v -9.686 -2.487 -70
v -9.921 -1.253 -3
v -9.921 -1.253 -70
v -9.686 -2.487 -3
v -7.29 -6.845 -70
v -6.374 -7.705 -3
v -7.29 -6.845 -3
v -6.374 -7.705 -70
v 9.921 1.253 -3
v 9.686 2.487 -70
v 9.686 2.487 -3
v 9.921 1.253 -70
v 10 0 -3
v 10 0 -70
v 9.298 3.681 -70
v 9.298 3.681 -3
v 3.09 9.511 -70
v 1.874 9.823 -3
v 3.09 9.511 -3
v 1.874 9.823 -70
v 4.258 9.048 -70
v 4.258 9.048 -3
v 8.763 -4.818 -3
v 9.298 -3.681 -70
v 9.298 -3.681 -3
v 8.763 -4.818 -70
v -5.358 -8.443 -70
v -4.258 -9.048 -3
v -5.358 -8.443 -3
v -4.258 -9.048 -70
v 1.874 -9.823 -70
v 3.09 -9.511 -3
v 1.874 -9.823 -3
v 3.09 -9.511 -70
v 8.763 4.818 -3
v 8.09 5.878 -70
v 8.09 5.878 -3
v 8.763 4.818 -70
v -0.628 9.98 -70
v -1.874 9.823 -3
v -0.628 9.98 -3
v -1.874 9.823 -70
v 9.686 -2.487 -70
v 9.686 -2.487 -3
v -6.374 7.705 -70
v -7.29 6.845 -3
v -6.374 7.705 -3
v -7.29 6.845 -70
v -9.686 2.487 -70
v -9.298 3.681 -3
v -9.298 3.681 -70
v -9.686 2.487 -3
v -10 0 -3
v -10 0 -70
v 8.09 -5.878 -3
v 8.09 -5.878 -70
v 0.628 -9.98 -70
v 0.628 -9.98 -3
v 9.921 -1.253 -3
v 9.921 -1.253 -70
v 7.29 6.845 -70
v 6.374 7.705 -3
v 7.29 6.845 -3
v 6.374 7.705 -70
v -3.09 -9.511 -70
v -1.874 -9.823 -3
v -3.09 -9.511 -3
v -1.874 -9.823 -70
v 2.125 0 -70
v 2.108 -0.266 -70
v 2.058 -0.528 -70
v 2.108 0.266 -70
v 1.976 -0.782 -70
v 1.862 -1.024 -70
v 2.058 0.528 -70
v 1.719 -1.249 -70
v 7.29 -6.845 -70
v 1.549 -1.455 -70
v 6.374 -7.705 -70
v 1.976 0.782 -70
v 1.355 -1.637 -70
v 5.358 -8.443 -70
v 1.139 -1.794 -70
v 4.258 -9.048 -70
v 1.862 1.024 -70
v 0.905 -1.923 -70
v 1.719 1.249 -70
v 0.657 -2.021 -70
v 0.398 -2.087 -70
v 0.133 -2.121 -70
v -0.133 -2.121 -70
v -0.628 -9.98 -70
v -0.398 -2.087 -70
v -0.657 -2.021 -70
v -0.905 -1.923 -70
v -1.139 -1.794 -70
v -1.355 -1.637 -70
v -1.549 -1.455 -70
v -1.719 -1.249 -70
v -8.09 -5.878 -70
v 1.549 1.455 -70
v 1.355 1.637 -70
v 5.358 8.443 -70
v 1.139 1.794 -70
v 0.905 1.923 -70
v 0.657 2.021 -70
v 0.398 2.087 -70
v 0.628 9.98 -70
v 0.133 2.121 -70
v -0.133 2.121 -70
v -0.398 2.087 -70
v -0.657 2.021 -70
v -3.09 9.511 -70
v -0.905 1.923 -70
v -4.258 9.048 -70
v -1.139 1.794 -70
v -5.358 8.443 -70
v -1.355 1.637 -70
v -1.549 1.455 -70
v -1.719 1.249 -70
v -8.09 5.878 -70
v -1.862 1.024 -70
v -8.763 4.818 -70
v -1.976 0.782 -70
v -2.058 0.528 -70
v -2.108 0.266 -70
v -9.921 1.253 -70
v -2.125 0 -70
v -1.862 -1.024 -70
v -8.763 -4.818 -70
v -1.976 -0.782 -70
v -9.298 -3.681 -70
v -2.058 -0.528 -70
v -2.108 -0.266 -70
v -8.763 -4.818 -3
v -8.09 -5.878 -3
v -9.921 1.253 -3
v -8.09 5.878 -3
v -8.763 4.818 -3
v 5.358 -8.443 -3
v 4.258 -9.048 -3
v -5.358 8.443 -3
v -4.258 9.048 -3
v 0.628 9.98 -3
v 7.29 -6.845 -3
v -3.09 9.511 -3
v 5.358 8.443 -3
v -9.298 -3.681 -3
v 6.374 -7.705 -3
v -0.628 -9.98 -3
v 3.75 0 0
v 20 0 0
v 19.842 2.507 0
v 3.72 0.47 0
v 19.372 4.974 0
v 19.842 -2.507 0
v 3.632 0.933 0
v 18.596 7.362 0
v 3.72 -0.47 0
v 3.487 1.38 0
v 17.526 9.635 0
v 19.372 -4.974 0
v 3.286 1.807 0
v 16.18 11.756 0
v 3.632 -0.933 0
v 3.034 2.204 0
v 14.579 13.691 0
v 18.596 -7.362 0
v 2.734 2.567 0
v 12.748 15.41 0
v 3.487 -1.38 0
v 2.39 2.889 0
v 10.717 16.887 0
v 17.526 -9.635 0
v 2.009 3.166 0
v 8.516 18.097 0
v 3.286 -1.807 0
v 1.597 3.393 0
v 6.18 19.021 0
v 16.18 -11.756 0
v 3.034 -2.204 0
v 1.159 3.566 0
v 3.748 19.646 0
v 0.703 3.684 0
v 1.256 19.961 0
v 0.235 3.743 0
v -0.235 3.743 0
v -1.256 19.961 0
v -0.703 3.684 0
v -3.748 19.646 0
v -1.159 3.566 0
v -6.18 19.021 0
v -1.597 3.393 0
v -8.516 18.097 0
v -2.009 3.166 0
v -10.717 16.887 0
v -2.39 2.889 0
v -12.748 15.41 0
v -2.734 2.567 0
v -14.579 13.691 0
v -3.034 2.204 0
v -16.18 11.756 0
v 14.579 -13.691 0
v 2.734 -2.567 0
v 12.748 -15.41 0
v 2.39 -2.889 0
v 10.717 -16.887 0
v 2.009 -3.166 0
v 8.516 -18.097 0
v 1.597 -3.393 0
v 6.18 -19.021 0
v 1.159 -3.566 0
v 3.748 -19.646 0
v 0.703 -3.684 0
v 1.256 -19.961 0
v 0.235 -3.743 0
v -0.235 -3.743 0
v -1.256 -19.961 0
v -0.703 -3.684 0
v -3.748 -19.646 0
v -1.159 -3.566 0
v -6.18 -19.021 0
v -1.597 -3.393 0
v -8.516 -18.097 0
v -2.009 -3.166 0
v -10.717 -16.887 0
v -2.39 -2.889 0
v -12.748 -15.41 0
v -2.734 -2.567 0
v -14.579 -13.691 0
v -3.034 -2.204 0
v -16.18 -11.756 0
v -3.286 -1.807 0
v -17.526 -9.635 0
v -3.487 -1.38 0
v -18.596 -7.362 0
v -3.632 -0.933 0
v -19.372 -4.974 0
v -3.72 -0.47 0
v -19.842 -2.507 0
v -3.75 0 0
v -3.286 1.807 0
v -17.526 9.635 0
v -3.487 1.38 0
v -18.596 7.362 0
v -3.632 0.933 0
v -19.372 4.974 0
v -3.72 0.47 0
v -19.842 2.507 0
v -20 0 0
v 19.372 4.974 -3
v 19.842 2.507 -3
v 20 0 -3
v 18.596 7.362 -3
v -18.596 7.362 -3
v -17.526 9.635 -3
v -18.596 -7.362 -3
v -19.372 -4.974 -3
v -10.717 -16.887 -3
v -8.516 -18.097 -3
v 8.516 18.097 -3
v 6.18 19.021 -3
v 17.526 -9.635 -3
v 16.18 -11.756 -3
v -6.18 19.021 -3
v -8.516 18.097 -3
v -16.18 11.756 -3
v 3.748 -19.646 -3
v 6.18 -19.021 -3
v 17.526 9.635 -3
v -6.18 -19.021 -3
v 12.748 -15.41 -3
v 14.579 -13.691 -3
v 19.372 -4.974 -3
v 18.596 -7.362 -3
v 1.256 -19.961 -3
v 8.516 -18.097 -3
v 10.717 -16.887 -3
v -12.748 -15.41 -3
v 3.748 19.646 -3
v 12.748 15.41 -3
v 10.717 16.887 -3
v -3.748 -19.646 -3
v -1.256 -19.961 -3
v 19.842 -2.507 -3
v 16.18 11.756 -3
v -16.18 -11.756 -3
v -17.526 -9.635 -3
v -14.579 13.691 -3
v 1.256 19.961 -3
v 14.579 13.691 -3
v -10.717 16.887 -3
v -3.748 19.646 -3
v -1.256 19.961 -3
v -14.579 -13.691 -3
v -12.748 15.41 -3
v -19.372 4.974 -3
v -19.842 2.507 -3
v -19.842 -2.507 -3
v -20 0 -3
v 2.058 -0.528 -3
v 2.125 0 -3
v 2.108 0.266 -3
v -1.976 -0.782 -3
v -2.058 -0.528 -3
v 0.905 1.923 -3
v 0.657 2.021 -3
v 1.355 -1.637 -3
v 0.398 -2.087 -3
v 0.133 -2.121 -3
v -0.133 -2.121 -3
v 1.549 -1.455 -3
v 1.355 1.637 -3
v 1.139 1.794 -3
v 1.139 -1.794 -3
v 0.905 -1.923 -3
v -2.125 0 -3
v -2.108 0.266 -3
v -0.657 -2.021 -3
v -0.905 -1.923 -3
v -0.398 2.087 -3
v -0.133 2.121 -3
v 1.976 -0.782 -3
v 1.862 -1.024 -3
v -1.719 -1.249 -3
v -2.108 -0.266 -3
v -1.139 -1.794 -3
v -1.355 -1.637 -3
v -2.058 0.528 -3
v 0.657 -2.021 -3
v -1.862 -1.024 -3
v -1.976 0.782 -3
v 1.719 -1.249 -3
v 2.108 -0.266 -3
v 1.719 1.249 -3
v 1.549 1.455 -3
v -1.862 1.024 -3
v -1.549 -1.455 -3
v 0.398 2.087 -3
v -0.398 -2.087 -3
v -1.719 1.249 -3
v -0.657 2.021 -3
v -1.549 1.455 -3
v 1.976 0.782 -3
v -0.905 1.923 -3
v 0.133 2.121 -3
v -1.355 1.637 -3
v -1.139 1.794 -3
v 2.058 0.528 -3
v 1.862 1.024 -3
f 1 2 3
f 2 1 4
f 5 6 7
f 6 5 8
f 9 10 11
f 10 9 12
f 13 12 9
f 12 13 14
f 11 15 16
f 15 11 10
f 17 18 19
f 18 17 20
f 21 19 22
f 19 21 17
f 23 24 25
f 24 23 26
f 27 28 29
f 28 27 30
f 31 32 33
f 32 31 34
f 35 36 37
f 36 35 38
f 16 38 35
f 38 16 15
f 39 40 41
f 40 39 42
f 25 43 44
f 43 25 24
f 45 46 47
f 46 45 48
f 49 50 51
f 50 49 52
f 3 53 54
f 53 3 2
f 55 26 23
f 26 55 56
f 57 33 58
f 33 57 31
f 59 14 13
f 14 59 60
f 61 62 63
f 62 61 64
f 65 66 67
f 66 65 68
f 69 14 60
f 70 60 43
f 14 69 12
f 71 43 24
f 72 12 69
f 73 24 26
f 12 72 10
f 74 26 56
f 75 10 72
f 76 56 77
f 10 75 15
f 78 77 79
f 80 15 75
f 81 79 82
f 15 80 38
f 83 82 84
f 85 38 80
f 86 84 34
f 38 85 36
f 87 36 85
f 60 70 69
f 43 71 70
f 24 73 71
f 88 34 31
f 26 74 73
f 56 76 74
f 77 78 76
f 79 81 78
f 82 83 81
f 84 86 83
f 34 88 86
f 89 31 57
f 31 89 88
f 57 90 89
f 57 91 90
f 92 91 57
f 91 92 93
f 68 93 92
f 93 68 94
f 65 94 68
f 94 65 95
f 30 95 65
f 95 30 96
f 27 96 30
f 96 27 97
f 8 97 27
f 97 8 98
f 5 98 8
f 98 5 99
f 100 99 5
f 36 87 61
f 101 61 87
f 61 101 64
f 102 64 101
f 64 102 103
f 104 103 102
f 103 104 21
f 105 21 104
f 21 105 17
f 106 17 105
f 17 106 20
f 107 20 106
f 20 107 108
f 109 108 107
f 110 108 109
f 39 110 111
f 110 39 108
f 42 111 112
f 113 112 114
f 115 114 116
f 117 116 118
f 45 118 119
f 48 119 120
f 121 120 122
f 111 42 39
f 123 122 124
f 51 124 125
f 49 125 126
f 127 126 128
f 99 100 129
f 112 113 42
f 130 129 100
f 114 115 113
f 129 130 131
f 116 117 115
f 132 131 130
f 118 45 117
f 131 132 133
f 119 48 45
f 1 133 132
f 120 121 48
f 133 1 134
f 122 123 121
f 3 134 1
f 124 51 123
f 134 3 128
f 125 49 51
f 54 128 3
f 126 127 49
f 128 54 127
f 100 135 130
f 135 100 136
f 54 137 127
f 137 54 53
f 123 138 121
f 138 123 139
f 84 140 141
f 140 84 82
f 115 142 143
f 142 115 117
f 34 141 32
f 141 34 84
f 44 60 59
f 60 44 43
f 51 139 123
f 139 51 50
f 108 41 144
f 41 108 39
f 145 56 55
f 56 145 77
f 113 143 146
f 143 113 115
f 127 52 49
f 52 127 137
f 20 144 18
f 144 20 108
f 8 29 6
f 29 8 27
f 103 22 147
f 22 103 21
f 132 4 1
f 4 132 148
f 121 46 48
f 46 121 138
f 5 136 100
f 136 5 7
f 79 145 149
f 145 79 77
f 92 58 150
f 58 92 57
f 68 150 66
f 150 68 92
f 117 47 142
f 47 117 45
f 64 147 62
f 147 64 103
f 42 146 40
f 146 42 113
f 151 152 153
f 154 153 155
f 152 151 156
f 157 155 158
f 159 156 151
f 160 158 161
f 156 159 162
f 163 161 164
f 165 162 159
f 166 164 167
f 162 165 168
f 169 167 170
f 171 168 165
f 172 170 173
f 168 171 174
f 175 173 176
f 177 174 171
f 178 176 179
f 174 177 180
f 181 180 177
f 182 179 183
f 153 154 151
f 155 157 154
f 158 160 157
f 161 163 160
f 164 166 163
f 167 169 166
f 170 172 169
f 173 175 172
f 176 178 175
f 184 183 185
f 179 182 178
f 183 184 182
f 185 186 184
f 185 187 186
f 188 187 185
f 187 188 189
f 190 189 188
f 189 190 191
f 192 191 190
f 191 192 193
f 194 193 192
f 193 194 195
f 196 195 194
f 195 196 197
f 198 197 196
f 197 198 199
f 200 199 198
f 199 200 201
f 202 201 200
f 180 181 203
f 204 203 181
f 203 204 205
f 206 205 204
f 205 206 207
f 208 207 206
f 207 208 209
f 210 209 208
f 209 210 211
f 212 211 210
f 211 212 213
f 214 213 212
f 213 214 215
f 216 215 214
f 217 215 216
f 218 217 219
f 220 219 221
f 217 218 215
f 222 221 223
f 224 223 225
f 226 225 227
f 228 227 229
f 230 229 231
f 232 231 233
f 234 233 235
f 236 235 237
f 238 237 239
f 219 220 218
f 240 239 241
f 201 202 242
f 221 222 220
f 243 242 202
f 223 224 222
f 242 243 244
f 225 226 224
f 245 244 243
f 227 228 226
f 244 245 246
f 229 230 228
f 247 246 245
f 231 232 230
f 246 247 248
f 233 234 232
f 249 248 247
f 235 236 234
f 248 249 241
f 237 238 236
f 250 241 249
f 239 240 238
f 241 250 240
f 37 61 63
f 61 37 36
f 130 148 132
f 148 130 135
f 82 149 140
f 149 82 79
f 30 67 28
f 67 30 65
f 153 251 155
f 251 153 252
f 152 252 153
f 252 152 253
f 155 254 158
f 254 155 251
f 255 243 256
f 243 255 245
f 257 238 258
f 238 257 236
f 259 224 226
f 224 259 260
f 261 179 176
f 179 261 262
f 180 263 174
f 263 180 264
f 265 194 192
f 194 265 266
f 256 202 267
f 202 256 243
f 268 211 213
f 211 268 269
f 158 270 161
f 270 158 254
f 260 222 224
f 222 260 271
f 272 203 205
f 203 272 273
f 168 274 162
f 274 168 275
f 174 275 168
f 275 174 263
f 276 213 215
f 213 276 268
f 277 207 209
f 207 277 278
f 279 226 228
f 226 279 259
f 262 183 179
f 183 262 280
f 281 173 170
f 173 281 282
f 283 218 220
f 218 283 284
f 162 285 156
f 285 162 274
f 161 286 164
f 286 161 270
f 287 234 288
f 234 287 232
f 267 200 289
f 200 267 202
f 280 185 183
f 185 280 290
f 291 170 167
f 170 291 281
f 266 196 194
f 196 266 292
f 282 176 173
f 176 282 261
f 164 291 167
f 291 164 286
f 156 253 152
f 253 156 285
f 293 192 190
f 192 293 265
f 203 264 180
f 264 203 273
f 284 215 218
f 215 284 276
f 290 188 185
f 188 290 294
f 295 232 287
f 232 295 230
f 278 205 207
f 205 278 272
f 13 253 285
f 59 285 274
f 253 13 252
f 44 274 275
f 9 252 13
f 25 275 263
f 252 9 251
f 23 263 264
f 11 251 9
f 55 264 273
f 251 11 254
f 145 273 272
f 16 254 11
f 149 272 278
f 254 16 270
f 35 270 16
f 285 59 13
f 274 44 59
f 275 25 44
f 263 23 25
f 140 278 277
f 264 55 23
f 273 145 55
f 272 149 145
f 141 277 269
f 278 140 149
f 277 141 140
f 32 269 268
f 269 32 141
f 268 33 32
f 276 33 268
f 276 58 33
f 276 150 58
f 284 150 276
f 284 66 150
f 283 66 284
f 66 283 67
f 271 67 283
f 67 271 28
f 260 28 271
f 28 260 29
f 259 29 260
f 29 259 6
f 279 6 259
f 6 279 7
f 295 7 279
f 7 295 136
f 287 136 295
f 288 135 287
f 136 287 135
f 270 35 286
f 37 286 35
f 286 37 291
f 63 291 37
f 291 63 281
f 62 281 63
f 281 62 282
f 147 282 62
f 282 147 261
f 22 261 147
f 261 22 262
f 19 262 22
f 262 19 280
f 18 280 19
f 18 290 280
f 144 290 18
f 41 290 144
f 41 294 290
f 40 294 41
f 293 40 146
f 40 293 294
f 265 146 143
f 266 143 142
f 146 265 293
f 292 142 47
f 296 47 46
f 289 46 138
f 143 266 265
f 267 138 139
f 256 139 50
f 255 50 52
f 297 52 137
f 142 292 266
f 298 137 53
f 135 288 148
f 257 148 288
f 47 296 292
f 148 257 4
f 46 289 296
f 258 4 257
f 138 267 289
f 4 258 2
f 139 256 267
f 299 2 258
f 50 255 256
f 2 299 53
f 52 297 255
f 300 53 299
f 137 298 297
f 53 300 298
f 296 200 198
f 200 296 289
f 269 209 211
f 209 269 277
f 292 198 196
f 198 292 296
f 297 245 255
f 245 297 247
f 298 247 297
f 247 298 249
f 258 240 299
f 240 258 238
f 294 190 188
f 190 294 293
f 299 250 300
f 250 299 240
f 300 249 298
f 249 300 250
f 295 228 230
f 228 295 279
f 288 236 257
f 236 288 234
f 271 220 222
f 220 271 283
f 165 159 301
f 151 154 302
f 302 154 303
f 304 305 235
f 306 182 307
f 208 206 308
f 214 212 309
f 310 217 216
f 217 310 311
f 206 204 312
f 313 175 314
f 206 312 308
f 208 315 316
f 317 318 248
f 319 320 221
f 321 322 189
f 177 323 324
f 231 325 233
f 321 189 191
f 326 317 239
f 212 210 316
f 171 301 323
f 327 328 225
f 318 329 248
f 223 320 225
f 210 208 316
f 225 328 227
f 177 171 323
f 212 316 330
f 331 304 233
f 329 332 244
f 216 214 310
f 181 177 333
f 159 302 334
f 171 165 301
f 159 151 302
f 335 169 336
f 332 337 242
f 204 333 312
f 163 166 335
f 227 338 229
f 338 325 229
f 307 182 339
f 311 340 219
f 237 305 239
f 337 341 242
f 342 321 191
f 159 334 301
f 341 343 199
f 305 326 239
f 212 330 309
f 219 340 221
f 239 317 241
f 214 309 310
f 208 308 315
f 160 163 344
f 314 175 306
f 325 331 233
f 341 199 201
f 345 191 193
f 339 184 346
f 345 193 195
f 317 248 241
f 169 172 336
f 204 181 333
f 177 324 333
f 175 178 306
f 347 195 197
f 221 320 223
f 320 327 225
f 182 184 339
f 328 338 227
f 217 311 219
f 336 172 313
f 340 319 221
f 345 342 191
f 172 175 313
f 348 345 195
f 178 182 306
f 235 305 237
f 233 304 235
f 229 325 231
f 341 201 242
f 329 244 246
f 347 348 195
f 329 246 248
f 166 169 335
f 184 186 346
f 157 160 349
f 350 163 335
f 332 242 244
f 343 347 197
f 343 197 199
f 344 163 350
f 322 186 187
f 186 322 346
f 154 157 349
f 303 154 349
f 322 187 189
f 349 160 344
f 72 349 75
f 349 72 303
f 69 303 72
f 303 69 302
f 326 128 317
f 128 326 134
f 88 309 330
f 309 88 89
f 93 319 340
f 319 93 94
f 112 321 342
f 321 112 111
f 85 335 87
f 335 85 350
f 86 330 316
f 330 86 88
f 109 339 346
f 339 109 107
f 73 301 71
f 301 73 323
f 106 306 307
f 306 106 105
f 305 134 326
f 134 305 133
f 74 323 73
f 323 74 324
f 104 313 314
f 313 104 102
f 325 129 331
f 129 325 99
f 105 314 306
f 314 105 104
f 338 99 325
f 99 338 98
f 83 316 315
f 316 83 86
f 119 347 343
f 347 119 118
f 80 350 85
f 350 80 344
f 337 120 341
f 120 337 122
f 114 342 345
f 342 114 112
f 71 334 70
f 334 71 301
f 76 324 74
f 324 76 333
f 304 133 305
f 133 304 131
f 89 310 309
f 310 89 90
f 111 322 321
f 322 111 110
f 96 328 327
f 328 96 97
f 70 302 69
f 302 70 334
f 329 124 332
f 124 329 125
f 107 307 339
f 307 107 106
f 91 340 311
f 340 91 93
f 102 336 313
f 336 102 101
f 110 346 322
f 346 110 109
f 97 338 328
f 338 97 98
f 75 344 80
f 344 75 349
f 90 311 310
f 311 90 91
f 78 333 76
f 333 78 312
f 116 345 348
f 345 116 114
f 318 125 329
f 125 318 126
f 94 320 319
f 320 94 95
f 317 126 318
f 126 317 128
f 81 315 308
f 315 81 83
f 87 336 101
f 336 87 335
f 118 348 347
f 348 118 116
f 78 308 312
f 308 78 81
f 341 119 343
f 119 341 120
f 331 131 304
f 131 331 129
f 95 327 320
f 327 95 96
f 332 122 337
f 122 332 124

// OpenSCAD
$fn = 50;


difference() {
	union() {
		translate(v = [0, 0, -70.0000000000]) {
			cylinder(h = 70, r = 10.0000000000);
		}
		translate(v = [0, 0, -3.0000000000]) {
			cylinder(h = 3, r = 20.0000000000);
		}
	}
	union() {
		translate(v = [0, 0, 0]) {
			rotate(a = [0, 0, 0]) {
				difference() {
					union() {
						#translate(v = [0, 0, -70.0000000000]) {
							cylinder(h = 70, r = 2.0000000000);
						}
						#translate(v = [0, 0, -3]) {
							cylinder(h = 3, r1 = 2.1250000000, r2 = 3.7500000000);
						}
						#translate(v = [0, 0, -70.0000000000]) {
							cylinder(h = 70, r = 2.1250000000);
						}
						#translate(v = [0, 0, -70.0000000000]) {
							cylinder(h = 70, r = 2.0000000000);
						}
					}
					union();
				}
			}
		}
	}
}
